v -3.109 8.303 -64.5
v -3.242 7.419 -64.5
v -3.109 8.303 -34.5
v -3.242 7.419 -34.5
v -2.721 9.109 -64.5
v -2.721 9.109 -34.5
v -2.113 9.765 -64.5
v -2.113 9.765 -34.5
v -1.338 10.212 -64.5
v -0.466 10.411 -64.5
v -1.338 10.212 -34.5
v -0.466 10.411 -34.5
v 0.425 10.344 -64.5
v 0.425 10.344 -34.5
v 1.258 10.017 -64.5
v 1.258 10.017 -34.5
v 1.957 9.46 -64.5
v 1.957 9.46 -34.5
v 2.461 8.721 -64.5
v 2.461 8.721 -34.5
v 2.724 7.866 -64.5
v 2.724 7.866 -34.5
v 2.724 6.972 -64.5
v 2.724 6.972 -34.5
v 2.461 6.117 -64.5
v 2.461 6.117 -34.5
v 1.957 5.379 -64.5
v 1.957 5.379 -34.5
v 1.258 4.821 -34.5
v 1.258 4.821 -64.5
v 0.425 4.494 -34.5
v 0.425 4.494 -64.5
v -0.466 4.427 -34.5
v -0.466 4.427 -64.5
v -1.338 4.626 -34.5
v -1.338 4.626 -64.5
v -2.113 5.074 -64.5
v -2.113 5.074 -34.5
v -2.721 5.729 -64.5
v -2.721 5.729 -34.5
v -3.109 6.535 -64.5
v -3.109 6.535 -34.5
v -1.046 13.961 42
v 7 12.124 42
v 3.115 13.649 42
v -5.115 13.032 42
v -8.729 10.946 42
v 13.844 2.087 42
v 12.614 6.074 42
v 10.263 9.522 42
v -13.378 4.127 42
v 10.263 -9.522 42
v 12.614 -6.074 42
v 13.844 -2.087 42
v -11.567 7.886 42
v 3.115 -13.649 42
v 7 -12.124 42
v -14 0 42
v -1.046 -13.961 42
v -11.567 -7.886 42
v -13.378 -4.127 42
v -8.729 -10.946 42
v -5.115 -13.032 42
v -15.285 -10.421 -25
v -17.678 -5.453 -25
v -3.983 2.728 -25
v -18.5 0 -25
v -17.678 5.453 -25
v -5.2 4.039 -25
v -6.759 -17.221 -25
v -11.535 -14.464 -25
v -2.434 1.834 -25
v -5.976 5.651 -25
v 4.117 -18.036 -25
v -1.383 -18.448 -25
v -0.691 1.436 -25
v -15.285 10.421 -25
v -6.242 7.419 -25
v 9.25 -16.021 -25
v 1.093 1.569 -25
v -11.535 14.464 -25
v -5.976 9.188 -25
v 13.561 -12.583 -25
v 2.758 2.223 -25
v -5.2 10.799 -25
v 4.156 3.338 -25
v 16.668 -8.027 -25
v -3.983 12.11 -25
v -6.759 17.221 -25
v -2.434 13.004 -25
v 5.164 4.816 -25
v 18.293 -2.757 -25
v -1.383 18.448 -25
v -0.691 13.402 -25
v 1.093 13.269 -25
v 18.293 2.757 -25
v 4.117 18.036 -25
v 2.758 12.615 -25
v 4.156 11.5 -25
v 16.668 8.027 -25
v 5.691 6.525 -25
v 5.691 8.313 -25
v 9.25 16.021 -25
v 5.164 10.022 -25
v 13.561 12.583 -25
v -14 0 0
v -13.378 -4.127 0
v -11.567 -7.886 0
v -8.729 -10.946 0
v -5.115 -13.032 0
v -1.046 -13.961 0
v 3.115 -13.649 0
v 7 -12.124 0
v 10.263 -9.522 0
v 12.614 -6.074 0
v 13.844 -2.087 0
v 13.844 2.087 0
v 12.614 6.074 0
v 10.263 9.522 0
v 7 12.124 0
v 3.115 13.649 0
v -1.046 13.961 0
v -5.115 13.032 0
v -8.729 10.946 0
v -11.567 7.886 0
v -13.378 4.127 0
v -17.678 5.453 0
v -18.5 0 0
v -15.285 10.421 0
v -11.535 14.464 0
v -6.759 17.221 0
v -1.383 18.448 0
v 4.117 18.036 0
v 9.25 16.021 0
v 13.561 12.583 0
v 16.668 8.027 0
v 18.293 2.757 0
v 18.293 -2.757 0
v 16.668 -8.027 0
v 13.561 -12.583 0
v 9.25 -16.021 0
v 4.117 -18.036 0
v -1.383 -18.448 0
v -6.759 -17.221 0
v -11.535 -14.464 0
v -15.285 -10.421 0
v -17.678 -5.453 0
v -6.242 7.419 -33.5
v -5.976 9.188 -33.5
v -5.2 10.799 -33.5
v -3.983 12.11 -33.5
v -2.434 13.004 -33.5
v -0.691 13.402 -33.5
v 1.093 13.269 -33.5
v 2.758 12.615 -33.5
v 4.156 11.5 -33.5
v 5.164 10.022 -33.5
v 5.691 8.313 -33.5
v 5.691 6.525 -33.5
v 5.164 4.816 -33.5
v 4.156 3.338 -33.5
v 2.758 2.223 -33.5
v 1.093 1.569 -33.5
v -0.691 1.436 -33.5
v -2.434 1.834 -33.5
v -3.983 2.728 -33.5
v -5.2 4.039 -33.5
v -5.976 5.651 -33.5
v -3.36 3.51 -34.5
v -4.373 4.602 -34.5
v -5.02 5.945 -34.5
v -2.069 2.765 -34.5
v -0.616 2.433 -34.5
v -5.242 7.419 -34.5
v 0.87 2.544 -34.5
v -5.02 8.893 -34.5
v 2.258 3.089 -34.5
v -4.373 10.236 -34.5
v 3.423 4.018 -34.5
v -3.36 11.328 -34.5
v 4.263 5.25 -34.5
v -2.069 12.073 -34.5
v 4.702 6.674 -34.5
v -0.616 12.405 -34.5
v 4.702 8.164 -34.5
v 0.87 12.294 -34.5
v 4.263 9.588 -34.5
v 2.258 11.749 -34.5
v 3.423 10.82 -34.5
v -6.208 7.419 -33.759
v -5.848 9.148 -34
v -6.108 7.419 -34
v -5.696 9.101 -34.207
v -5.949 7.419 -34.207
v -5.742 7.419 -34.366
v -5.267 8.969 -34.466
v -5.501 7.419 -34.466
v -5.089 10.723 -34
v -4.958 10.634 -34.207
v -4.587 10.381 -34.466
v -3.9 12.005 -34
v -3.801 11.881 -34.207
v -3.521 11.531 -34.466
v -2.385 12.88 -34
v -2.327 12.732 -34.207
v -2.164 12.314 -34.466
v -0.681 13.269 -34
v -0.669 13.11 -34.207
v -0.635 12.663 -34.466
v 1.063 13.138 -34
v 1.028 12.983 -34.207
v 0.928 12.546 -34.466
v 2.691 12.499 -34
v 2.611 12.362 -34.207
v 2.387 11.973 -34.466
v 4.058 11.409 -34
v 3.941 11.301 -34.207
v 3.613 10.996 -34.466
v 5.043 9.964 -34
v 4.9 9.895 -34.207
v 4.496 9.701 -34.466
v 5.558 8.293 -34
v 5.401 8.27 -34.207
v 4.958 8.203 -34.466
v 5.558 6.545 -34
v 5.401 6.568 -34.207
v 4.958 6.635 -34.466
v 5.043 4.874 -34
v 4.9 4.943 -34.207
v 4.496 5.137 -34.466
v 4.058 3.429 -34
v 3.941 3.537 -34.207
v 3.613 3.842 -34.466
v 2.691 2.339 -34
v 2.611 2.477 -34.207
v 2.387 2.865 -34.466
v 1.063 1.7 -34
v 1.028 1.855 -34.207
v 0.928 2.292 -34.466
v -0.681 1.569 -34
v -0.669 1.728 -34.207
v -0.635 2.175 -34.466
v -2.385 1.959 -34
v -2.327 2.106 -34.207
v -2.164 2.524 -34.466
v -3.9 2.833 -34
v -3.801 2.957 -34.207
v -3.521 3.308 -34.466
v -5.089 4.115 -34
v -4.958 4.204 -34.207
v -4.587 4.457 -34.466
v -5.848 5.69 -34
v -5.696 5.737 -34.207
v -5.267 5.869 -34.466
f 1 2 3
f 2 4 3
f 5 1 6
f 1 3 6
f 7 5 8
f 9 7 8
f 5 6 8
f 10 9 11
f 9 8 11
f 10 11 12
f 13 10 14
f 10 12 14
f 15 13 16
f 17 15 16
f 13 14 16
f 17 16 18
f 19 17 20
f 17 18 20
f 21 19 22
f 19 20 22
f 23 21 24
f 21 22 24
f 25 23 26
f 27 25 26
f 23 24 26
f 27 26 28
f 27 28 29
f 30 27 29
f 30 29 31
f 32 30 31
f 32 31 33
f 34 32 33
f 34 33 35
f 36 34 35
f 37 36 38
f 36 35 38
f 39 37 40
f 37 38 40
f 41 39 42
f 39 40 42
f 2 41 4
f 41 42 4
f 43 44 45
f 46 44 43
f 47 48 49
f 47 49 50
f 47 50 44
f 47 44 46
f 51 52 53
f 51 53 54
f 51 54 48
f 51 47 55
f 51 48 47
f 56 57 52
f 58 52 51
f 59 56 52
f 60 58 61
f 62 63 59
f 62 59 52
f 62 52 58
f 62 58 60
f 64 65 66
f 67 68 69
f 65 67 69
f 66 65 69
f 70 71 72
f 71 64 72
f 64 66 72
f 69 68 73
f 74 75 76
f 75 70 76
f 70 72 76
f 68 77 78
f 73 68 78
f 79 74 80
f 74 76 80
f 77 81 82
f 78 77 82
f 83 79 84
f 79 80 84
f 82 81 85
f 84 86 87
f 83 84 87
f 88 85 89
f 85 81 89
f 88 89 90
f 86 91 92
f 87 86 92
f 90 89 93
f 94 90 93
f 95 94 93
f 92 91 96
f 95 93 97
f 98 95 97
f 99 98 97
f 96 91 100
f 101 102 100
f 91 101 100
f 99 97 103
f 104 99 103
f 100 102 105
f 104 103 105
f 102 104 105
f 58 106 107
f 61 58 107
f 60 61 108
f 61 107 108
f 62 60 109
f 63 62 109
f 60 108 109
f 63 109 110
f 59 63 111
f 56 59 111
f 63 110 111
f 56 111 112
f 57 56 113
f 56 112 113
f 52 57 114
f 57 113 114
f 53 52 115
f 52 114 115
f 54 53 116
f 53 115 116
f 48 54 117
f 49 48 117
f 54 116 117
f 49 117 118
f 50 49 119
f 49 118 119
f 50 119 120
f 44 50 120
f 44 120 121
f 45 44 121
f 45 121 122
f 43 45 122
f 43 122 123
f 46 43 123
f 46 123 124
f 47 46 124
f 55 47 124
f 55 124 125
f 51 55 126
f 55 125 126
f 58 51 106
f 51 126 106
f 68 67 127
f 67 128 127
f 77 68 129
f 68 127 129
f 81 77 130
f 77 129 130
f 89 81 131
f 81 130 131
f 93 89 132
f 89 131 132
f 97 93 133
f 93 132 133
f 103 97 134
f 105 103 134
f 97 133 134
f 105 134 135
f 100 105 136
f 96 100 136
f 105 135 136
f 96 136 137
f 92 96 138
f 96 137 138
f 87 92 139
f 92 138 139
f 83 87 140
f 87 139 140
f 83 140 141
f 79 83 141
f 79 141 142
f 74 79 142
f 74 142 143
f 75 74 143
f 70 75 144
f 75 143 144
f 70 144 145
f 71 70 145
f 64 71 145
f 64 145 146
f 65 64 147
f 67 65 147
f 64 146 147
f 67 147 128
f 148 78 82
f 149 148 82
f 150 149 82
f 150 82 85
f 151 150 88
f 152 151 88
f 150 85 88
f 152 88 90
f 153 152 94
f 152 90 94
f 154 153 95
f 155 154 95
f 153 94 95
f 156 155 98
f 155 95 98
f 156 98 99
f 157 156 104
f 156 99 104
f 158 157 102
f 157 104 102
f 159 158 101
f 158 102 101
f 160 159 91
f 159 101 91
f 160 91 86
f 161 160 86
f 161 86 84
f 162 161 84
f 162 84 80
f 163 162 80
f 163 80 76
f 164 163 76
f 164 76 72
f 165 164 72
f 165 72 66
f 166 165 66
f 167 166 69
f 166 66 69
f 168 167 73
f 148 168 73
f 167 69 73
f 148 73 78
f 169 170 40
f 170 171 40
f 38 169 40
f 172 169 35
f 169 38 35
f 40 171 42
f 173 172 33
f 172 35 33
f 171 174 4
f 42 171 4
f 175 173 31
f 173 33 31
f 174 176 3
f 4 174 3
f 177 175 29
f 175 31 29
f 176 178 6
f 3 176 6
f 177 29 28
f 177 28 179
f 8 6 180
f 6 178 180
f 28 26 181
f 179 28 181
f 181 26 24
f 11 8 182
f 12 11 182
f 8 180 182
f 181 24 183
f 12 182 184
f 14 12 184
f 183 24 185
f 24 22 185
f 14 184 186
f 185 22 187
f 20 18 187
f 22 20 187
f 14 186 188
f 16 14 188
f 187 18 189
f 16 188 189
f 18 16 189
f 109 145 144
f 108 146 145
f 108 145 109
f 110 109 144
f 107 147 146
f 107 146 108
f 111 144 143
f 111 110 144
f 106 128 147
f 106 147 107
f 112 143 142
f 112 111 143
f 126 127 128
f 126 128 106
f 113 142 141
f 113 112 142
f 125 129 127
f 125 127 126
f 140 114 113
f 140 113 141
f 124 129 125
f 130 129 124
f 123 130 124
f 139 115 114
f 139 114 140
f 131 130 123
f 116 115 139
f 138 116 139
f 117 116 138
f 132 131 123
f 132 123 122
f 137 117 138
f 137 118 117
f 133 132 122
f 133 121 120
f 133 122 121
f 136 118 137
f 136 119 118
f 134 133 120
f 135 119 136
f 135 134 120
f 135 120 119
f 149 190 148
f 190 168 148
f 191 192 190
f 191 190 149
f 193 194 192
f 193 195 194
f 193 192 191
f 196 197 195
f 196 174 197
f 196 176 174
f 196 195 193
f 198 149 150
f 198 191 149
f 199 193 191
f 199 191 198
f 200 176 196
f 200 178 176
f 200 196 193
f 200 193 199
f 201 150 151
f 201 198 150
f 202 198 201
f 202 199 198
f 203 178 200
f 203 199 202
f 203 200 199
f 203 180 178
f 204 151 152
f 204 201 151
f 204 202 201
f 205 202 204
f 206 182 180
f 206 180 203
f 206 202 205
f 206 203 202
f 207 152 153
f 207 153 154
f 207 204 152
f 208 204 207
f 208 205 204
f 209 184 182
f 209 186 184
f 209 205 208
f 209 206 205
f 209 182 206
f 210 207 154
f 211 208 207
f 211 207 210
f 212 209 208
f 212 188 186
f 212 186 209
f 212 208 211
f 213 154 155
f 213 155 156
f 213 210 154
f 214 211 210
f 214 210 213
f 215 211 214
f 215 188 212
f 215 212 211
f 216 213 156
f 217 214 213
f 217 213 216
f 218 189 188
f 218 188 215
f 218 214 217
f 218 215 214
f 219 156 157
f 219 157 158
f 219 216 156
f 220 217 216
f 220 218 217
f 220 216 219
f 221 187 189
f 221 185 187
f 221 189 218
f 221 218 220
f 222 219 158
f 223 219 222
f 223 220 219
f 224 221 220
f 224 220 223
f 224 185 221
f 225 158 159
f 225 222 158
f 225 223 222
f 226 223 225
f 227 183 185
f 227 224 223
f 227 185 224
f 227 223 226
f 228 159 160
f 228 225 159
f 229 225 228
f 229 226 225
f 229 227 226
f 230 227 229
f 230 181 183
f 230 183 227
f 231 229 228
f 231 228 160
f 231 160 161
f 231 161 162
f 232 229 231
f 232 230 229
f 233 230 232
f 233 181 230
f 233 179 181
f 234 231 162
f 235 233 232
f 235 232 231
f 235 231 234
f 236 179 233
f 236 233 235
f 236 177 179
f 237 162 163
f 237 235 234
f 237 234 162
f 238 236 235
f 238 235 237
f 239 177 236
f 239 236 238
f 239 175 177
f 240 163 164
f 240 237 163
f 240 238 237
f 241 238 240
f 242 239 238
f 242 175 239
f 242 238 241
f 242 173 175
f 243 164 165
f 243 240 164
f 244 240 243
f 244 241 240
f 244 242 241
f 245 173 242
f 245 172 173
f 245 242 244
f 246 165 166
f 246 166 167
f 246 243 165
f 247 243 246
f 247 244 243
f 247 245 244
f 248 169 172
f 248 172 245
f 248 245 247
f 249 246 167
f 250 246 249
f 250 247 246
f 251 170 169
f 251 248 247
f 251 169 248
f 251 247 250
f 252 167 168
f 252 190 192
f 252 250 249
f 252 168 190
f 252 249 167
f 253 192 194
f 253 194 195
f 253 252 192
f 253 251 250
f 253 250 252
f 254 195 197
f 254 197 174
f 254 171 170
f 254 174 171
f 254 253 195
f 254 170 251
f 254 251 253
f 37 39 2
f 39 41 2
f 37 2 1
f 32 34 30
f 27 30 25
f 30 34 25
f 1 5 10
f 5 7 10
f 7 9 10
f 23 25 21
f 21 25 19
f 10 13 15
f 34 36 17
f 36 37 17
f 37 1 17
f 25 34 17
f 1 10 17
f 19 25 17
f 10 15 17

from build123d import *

# Parameters (mm, degrees)
SKETCH1_W           = 18.5
SKETCH1_H           = 25
SKETCH2_R           = 14
BOSS_EXTRUDE1_DEPTH = 42
FILLET1_R           = 1


with BuildPart() as part:
    # Sketch1 → Revolve1 (revolve)
    with BuildSketch(Plane.XZ, mode=Mode.PRIVATE) as revolve1_sk:
        with Locations((9.25, -12.5)):
            Rectangle(SKETCH1_W, SKETCH1_H)
    revolve(revolve1_sk.sketch.rotate(Axis((0, 0, 0), (0, 0, -1)), 180), axis=Axis((0, 0, 0), (0, 0, -1)))

    # Sketch2 → Boss-Extrude1 (add)
    with BuildSketch(Plane.XY):
        with Locations(Location((0, 0, 0), (0, 0, 180))):
            Circle(SKETCH2_R)
    extrude(amount=BOSS_EXTRUDE1_DEPTH)

    # Sketch3 → Revolve2 (revolve)
    with BuildSketch(Plane.XZ.offset(-7.419045711), mode=Mode.PRIVATE) as revolve2_sk:
        Polygon((5.757740364, -25), (-0.242259636, -25), (-0.242259636, -64.5), (2.757740364, -64.5), (2.757740364, -34.5), (5.757740364, -34.5), align=None)
    revolve(revolve2_sk.sketch.rotate(Axis((-0.242259636, 7.419045711, -25), (0, 0, -1)), 180), axis=Axis((-0.242259636, 7.419045711, -25), (0, 0, -1)))

    # Fillet1
    fillet1_edges = [part.edges().sort_by_distance(p)[0] for p in [
        (5.757740364, 7.419045711, -34.5),
    ]]
    fillet(fillet1_edges, radius=FILLET1_R)


solid = part.part
